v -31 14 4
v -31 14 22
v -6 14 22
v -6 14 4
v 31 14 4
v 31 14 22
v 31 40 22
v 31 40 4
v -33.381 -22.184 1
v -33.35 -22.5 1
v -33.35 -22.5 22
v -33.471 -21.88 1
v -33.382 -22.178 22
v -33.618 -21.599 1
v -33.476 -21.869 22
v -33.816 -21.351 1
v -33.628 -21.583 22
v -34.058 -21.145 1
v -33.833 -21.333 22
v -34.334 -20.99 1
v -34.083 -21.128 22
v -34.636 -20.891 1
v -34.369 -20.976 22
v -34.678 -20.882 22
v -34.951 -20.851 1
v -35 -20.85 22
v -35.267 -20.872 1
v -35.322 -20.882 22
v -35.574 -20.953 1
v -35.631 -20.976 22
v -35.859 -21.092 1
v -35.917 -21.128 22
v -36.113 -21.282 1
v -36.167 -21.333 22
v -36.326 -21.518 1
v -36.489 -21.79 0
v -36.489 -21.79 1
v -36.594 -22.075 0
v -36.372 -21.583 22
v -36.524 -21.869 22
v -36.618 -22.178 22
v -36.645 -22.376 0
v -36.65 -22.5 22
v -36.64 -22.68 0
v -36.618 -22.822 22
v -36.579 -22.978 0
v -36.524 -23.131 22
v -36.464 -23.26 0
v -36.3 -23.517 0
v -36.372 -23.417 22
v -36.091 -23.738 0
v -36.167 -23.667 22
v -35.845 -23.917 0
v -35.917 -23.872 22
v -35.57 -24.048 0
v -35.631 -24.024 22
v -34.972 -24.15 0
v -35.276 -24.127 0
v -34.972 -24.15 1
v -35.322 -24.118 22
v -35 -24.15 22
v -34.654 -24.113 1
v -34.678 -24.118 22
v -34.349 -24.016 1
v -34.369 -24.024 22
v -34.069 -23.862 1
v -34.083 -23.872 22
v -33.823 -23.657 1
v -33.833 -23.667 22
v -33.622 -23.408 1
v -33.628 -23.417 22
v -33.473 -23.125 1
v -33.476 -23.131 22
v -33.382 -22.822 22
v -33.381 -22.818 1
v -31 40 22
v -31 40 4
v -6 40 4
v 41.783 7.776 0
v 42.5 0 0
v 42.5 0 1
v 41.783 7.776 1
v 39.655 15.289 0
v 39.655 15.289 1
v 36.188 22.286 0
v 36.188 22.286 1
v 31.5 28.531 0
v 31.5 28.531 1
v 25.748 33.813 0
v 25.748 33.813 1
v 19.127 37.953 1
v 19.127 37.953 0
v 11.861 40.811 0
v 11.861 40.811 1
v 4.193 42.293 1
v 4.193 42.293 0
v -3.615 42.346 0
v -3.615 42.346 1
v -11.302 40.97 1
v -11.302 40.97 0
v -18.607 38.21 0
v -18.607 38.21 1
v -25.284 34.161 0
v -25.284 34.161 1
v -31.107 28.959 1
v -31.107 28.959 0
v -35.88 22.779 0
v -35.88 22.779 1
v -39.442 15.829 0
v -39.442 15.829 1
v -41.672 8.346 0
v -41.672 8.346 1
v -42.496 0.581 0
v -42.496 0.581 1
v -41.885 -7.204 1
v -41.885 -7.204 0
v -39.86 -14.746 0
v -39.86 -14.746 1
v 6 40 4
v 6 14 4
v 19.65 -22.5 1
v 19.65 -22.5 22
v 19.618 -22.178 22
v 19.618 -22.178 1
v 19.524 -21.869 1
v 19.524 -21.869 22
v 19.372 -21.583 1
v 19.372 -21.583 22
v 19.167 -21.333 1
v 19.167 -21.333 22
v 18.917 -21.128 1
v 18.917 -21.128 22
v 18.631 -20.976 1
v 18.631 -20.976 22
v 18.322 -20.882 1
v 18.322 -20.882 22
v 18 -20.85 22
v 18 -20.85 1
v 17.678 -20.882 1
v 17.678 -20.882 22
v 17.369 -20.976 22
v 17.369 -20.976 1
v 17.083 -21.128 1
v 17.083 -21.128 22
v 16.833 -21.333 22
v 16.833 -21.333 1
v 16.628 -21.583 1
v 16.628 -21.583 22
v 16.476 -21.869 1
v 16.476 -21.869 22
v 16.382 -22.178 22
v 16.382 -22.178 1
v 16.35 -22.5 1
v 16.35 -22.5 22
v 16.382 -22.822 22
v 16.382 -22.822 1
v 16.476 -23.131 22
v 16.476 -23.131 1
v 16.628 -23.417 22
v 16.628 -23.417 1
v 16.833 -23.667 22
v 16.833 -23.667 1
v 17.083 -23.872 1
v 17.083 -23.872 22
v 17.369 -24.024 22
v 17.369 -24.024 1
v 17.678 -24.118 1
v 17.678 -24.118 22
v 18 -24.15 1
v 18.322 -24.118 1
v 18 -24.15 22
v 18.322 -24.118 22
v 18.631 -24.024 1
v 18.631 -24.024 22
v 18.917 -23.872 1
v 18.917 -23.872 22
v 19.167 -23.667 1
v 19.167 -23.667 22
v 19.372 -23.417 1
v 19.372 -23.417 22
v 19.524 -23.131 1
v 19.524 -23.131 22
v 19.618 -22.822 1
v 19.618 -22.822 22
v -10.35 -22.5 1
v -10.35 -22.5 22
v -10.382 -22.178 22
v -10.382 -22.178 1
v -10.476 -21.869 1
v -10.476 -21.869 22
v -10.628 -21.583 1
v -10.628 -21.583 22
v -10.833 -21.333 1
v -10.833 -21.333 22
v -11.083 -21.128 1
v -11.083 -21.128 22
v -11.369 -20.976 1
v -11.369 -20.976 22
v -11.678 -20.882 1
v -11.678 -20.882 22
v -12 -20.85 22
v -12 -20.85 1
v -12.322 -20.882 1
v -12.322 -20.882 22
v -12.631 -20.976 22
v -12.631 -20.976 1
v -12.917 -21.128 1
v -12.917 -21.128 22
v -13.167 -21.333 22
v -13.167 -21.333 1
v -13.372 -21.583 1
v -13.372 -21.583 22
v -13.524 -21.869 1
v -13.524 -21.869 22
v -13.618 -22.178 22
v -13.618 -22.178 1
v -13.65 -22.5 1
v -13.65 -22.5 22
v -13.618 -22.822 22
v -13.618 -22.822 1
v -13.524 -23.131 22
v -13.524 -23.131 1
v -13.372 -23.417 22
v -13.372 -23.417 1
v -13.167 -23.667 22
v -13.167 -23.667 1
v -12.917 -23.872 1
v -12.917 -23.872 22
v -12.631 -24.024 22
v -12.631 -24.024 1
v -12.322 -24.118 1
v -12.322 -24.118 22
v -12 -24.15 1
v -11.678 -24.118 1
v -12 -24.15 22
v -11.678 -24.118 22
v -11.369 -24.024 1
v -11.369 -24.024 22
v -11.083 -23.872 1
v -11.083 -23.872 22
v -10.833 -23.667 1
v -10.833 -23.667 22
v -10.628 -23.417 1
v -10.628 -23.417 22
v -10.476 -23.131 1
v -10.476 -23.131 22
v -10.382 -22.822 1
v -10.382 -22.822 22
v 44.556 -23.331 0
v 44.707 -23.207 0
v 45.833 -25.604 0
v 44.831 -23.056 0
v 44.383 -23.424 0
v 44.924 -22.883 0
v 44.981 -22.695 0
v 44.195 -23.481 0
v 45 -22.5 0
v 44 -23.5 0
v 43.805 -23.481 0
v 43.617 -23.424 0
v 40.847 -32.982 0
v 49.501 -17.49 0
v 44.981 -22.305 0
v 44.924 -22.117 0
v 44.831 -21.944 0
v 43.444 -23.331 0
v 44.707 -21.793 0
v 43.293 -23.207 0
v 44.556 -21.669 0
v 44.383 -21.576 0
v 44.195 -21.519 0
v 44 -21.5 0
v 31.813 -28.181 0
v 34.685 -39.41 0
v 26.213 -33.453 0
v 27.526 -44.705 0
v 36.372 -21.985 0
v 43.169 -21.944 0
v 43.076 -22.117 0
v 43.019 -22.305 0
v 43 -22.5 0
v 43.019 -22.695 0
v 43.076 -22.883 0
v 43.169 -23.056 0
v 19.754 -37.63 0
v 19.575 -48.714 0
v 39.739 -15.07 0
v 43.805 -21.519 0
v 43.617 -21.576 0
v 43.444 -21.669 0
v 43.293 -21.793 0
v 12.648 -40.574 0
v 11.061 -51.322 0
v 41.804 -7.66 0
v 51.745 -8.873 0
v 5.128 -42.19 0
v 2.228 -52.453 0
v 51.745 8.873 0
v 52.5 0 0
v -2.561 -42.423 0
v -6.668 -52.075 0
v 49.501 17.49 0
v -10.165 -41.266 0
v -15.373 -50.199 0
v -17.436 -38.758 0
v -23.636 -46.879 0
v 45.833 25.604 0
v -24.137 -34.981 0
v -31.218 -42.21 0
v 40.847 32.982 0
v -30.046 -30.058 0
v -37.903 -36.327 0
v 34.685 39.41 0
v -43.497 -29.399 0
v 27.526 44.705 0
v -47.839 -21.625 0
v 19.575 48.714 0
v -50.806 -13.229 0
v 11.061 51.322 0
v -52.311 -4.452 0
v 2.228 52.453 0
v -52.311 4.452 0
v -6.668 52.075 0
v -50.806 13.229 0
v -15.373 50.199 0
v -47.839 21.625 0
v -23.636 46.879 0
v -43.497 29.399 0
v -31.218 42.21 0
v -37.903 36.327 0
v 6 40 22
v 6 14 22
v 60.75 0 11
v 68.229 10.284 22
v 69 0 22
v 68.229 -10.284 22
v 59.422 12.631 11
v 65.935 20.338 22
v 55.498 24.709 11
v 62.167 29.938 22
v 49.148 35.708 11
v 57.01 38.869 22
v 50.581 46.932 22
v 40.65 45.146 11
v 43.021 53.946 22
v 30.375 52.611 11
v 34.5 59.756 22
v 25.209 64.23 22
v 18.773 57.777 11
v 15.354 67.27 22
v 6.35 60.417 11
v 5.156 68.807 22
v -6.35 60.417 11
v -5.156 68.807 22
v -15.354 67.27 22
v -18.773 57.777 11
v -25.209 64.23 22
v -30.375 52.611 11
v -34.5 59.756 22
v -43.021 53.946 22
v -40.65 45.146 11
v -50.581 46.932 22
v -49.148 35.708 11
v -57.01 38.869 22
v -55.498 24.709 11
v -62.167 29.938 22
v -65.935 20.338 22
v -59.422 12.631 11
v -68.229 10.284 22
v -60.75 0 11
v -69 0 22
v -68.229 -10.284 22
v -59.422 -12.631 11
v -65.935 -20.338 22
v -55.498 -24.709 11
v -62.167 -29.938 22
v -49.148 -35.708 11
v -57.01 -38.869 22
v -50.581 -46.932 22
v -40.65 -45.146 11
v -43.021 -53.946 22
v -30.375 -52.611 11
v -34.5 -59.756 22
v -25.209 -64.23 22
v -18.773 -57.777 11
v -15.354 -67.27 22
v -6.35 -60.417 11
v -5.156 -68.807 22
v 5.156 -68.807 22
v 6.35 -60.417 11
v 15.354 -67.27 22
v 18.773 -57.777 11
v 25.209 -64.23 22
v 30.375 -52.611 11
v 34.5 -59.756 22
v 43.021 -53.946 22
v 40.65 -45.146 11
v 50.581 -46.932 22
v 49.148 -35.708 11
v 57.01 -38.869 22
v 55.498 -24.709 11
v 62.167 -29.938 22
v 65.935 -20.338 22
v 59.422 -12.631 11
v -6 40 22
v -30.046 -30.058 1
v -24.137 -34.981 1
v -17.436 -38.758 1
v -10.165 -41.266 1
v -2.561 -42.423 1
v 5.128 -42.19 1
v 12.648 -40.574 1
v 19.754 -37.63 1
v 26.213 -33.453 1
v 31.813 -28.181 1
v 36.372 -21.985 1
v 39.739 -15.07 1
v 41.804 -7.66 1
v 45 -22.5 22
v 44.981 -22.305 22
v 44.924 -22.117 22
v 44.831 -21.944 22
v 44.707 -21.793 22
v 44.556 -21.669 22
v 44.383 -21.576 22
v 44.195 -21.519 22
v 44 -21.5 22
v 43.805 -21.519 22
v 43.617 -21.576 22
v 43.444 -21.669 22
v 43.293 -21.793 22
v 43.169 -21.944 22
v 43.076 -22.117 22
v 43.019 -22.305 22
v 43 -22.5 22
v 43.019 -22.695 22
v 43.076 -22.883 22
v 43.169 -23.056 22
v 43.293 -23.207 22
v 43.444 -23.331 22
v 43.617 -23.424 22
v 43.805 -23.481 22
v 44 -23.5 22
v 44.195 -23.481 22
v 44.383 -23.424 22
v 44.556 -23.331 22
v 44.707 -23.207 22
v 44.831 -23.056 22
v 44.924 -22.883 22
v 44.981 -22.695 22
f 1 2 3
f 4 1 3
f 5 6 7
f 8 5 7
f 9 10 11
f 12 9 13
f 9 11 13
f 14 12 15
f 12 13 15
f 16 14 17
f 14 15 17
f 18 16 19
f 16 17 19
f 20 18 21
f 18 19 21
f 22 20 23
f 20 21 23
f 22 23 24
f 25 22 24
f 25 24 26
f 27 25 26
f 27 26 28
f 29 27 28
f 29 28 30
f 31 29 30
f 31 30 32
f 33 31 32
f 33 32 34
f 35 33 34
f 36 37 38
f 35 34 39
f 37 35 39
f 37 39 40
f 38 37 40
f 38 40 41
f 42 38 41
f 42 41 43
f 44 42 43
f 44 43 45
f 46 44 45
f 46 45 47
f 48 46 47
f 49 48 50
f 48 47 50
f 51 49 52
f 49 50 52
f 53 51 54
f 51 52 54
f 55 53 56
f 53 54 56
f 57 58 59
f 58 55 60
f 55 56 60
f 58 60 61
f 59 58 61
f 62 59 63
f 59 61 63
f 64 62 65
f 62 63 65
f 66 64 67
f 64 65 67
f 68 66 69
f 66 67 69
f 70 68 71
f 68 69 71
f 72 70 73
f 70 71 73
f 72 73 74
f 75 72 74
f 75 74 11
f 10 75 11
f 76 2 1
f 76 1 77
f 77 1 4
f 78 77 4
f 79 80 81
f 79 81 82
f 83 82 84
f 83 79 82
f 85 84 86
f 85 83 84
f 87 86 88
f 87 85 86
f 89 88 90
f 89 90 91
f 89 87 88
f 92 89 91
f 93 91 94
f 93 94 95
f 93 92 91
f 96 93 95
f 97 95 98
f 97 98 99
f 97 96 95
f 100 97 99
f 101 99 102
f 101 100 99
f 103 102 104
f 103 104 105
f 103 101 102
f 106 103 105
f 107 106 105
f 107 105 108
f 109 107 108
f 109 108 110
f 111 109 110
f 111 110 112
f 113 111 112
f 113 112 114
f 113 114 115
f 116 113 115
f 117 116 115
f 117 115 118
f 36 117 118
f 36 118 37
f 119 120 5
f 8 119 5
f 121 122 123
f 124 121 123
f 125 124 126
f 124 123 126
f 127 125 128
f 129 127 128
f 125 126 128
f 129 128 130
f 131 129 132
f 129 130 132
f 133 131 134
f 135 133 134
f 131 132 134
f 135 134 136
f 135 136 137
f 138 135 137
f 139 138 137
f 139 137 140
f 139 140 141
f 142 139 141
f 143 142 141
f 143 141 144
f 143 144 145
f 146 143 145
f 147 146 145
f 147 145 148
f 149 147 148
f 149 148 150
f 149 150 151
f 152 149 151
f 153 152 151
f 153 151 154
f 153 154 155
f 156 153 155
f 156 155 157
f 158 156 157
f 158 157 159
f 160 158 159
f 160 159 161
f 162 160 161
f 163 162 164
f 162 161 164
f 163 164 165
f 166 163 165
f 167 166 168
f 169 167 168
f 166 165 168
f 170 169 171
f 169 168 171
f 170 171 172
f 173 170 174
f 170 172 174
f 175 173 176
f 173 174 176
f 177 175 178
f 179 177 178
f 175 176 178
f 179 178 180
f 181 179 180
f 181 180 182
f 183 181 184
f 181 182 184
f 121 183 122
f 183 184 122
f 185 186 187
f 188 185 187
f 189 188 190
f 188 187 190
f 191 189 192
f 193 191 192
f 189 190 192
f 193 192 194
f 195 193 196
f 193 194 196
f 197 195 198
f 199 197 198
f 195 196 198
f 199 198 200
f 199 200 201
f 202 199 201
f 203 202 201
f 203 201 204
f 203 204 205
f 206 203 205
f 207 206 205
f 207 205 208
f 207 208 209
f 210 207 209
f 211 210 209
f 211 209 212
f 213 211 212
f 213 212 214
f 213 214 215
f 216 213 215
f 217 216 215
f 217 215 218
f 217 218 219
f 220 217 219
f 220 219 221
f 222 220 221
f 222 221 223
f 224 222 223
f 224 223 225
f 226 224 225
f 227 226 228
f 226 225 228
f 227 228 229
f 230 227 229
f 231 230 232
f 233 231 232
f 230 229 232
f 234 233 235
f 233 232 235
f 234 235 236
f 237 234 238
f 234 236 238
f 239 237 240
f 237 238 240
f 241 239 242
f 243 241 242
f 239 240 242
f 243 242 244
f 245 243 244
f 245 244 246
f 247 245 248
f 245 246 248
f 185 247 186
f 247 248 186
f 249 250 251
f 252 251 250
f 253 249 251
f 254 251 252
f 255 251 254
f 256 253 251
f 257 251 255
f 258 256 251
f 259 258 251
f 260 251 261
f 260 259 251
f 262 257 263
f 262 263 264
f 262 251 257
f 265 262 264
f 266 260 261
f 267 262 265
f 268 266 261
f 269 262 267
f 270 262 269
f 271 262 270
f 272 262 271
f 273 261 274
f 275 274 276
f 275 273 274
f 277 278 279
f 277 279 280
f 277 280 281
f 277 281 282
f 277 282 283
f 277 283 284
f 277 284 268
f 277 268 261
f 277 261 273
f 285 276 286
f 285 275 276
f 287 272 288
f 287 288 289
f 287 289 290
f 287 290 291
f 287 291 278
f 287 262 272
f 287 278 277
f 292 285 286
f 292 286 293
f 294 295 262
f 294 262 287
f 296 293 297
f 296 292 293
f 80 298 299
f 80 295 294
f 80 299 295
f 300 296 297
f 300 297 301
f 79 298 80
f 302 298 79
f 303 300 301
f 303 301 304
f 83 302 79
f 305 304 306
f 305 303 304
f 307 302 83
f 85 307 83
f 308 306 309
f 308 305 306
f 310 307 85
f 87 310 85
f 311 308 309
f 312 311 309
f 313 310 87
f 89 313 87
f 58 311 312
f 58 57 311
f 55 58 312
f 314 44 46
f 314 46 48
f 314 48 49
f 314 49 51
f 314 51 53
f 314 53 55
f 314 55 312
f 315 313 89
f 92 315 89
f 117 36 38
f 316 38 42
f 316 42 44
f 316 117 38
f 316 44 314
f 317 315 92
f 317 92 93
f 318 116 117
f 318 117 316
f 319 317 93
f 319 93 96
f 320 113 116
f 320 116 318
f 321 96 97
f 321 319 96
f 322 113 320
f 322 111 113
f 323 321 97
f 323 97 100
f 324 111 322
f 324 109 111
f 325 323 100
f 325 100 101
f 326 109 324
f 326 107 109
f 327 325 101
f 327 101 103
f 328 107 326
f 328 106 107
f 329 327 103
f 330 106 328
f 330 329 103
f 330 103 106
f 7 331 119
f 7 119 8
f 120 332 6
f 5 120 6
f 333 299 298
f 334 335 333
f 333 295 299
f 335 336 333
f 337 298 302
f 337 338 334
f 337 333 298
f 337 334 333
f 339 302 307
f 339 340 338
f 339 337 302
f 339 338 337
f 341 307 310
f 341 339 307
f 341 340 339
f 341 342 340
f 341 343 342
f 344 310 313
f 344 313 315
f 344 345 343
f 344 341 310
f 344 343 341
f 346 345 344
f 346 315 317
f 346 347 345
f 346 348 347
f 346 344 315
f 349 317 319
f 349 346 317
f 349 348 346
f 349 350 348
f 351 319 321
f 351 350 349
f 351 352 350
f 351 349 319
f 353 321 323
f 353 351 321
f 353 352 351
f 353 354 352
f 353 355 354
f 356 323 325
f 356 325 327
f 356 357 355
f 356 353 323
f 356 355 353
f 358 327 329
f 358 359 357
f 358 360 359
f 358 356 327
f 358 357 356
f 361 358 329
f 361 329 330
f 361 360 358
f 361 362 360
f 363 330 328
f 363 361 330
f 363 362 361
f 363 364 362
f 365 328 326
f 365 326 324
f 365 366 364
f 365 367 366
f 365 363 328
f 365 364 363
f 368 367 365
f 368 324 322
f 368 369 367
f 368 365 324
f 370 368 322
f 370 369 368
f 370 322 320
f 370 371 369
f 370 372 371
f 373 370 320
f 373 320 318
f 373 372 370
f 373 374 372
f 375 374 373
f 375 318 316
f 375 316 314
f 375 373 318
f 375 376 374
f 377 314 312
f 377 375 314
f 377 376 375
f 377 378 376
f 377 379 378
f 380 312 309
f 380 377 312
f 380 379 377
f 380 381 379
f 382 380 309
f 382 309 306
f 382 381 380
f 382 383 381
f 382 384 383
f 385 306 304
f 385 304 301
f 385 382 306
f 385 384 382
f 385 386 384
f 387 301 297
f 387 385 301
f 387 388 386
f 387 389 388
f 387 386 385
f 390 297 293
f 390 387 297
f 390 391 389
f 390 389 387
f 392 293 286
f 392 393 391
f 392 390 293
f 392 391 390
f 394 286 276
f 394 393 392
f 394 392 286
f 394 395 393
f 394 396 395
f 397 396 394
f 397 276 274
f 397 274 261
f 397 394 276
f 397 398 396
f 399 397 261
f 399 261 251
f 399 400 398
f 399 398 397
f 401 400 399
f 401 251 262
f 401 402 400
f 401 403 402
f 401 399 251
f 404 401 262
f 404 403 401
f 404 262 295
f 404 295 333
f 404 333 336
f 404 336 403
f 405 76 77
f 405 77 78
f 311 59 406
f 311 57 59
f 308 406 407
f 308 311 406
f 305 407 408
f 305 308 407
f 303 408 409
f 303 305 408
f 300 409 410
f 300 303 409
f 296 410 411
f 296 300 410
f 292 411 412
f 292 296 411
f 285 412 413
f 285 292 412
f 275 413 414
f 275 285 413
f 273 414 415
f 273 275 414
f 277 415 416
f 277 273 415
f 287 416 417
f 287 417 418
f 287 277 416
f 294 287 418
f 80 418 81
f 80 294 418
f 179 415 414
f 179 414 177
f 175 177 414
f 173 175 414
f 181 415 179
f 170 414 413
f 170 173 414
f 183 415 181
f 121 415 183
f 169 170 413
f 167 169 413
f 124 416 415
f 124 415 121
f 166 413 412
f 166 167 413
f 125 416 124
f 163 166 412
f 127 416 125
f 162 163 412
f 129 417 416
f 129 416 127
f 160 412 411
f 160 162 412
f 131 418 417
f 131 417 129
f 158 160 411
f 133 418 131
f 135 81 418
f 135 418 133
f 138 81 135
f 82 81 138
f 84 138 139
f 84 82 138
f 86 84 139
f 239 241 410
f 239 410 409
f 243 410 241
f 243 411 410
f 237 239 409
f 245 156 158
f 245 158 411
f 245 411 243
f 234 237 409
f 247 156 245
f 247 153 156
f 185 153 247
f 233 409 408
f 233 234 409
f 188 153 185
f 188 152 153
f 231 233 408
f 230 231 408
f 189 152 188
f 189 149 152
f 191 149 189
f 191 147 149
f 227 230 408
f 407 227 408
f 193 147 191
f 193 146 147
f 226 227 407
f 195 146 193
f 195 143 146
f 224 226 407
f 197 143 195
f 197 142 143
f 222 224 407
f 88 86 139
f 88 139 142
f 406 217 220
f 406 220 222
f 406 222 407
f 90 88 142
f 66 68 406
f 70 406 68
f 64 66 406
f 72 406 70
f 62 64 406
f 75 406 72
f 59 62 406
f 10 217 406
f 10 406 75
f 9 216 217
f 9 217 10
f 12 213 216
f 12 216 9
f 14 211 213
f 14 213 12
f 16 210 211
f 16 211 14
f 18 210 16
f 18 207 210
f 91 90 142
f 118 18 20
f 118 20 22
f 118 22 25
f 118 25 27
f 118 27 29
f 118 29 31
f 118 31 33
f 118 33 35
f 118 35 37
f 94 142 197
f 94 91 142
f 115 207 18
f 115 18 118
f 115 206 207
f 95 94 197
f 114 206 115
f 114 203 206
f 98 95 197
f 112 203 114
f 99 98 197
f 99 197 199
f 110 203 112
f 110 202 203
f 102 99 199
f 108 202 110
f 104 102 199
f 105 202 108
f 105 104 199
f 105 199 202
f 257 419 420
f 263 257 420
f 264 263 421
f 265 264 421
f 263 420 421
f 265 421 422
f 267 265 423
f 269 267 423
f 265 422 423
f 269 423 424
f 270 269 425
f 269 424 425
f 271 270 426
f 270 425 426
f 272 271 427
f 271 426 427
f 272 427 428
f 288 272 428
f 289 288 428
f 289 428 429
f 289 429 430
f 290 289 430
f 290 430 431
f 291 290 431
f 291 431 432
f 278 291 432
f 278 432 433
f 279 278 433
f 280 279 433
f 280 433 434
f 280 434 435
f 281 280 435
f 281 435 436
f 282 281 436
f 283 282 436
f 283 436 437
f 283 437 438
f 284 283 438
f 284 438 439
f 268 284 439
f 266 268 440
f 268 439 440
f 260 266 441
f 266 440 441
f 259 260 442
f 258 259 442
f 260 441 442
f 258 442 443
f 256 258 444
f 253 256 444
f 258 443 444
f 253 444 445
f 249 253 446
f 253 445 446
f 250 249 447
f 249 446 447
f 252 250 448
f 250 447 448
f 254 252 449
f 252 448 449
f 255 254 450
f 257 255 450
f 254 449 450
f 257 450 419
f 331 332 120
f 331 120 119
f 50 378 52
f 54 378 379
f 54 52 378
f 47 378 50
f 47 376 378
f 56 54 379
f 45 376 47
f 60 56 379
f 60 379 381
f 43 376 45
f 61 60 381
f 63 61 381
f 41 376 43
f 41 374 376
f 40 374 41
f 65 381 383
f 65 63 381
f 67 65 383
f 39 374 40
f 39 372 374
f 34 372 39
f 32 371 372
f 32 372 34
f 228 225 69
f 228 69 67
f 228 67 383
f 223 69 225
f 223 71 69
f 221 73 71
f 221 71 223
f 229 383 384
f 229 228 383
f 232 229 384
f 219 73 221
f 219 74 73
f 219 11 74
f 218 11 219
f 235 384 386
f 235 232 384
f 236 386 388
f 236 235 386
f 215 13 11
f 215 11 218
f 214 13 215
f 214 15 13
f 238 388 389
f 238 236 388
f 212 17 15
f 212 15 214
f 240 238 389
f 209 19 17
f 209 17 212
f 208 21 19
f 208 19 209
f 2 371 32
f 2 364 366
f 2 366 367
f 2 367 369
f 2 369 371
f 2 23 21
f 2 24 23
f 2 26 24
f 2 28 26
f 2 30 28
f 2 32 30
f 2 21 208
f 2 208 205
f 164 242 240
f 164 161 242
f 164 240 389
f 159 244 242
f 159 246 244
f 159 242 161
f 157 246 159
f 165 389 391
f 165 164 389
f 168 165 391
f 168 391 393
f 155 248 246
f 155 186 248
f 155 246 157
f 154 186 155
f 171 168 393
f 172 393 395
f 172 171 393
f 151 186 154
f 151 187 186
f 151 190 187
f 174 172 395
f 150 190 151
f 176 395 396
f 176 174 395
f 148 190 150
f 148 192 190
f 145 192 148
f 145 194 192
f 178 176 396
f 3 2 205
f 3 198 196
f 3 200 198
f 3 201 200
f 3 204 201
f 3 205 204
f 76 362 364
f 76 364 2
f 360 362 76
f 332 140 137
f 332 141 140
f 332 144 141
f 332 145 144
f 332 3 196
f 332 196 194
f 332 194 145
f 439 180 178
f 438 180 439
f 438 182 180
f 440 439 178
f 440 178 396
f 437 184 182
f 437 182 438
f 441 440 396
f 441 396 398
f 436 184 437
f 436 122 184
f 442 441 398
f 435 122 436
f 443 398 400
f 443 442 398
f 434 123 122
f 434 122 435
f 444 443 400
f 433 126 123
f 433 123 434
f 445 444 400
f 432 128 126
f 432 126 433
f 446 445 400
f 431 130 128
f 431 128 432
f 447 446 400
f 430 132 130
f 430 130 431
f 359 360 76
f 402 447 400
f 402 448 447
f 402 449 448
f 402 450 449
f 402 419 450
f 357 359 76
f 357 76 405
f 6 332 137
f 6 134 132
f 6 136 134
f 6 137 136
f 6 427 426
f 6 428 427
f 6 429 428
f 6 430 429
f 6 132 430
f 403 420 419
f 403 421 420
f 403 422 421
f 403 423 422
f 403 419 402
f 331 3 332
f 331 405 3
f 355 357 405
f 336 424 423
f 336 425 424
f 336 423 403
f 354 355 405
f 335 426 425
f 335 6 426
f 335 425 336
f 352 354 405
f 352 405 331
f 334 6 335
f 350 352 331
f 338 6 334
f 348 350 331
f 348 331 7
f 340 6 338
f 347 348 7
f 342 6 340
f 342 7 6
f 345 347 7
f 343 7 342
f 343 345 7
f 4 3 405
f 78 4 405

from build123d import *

# Parameters (mm, degrees)
F2_R     = 1.65
F2_R_2   = 1
F3_DEPTH = 25
F4_W     = 25
F4_H     = 26
F5_DEPTH = 18


with BuildPart() as f1:
    # F0 (on Front) → F1 (revolve)
    with BuildSketch(Plane.XZ):
        Polygon((0, 22), (0, 1), (42.5, 1), (42.5, 0), (52.5, 0), (69, 22), align=None)
    revolve(axis=Axis((0, 0, 11.5), (0, 0, 1)))

    # F2 (on face) → F3 (cut)
    with BuildSketch(Plane.XY.offset(22)):
        with Locations((-35, -22.5)):
            Circle(F2_R)
        with Locations((-12, -22.5)):
            Circle(F2_R)
        with Locations((18, -22.5)):
            Circle(F2_R)
        with Locations((44, -22.5)):
            Circle(F2_R_2)
    extrude(amount=-F3_DEPTH, mode=Mode.SUBTRACT)

    # F4 (on face) → F5 (cut)
    with BuildSketch(Plane.XY.offset(22)):
        with Locations((-18.5, 27)):
            Rectangle(F4_W, F4_H)
        with Locations((18.5, 27)):
            Rectangle(F4_W, F4_H)
    extrude(amount=-F5_DEPTH, mode=Mode.SUBTRACT)


solid = f1.part
